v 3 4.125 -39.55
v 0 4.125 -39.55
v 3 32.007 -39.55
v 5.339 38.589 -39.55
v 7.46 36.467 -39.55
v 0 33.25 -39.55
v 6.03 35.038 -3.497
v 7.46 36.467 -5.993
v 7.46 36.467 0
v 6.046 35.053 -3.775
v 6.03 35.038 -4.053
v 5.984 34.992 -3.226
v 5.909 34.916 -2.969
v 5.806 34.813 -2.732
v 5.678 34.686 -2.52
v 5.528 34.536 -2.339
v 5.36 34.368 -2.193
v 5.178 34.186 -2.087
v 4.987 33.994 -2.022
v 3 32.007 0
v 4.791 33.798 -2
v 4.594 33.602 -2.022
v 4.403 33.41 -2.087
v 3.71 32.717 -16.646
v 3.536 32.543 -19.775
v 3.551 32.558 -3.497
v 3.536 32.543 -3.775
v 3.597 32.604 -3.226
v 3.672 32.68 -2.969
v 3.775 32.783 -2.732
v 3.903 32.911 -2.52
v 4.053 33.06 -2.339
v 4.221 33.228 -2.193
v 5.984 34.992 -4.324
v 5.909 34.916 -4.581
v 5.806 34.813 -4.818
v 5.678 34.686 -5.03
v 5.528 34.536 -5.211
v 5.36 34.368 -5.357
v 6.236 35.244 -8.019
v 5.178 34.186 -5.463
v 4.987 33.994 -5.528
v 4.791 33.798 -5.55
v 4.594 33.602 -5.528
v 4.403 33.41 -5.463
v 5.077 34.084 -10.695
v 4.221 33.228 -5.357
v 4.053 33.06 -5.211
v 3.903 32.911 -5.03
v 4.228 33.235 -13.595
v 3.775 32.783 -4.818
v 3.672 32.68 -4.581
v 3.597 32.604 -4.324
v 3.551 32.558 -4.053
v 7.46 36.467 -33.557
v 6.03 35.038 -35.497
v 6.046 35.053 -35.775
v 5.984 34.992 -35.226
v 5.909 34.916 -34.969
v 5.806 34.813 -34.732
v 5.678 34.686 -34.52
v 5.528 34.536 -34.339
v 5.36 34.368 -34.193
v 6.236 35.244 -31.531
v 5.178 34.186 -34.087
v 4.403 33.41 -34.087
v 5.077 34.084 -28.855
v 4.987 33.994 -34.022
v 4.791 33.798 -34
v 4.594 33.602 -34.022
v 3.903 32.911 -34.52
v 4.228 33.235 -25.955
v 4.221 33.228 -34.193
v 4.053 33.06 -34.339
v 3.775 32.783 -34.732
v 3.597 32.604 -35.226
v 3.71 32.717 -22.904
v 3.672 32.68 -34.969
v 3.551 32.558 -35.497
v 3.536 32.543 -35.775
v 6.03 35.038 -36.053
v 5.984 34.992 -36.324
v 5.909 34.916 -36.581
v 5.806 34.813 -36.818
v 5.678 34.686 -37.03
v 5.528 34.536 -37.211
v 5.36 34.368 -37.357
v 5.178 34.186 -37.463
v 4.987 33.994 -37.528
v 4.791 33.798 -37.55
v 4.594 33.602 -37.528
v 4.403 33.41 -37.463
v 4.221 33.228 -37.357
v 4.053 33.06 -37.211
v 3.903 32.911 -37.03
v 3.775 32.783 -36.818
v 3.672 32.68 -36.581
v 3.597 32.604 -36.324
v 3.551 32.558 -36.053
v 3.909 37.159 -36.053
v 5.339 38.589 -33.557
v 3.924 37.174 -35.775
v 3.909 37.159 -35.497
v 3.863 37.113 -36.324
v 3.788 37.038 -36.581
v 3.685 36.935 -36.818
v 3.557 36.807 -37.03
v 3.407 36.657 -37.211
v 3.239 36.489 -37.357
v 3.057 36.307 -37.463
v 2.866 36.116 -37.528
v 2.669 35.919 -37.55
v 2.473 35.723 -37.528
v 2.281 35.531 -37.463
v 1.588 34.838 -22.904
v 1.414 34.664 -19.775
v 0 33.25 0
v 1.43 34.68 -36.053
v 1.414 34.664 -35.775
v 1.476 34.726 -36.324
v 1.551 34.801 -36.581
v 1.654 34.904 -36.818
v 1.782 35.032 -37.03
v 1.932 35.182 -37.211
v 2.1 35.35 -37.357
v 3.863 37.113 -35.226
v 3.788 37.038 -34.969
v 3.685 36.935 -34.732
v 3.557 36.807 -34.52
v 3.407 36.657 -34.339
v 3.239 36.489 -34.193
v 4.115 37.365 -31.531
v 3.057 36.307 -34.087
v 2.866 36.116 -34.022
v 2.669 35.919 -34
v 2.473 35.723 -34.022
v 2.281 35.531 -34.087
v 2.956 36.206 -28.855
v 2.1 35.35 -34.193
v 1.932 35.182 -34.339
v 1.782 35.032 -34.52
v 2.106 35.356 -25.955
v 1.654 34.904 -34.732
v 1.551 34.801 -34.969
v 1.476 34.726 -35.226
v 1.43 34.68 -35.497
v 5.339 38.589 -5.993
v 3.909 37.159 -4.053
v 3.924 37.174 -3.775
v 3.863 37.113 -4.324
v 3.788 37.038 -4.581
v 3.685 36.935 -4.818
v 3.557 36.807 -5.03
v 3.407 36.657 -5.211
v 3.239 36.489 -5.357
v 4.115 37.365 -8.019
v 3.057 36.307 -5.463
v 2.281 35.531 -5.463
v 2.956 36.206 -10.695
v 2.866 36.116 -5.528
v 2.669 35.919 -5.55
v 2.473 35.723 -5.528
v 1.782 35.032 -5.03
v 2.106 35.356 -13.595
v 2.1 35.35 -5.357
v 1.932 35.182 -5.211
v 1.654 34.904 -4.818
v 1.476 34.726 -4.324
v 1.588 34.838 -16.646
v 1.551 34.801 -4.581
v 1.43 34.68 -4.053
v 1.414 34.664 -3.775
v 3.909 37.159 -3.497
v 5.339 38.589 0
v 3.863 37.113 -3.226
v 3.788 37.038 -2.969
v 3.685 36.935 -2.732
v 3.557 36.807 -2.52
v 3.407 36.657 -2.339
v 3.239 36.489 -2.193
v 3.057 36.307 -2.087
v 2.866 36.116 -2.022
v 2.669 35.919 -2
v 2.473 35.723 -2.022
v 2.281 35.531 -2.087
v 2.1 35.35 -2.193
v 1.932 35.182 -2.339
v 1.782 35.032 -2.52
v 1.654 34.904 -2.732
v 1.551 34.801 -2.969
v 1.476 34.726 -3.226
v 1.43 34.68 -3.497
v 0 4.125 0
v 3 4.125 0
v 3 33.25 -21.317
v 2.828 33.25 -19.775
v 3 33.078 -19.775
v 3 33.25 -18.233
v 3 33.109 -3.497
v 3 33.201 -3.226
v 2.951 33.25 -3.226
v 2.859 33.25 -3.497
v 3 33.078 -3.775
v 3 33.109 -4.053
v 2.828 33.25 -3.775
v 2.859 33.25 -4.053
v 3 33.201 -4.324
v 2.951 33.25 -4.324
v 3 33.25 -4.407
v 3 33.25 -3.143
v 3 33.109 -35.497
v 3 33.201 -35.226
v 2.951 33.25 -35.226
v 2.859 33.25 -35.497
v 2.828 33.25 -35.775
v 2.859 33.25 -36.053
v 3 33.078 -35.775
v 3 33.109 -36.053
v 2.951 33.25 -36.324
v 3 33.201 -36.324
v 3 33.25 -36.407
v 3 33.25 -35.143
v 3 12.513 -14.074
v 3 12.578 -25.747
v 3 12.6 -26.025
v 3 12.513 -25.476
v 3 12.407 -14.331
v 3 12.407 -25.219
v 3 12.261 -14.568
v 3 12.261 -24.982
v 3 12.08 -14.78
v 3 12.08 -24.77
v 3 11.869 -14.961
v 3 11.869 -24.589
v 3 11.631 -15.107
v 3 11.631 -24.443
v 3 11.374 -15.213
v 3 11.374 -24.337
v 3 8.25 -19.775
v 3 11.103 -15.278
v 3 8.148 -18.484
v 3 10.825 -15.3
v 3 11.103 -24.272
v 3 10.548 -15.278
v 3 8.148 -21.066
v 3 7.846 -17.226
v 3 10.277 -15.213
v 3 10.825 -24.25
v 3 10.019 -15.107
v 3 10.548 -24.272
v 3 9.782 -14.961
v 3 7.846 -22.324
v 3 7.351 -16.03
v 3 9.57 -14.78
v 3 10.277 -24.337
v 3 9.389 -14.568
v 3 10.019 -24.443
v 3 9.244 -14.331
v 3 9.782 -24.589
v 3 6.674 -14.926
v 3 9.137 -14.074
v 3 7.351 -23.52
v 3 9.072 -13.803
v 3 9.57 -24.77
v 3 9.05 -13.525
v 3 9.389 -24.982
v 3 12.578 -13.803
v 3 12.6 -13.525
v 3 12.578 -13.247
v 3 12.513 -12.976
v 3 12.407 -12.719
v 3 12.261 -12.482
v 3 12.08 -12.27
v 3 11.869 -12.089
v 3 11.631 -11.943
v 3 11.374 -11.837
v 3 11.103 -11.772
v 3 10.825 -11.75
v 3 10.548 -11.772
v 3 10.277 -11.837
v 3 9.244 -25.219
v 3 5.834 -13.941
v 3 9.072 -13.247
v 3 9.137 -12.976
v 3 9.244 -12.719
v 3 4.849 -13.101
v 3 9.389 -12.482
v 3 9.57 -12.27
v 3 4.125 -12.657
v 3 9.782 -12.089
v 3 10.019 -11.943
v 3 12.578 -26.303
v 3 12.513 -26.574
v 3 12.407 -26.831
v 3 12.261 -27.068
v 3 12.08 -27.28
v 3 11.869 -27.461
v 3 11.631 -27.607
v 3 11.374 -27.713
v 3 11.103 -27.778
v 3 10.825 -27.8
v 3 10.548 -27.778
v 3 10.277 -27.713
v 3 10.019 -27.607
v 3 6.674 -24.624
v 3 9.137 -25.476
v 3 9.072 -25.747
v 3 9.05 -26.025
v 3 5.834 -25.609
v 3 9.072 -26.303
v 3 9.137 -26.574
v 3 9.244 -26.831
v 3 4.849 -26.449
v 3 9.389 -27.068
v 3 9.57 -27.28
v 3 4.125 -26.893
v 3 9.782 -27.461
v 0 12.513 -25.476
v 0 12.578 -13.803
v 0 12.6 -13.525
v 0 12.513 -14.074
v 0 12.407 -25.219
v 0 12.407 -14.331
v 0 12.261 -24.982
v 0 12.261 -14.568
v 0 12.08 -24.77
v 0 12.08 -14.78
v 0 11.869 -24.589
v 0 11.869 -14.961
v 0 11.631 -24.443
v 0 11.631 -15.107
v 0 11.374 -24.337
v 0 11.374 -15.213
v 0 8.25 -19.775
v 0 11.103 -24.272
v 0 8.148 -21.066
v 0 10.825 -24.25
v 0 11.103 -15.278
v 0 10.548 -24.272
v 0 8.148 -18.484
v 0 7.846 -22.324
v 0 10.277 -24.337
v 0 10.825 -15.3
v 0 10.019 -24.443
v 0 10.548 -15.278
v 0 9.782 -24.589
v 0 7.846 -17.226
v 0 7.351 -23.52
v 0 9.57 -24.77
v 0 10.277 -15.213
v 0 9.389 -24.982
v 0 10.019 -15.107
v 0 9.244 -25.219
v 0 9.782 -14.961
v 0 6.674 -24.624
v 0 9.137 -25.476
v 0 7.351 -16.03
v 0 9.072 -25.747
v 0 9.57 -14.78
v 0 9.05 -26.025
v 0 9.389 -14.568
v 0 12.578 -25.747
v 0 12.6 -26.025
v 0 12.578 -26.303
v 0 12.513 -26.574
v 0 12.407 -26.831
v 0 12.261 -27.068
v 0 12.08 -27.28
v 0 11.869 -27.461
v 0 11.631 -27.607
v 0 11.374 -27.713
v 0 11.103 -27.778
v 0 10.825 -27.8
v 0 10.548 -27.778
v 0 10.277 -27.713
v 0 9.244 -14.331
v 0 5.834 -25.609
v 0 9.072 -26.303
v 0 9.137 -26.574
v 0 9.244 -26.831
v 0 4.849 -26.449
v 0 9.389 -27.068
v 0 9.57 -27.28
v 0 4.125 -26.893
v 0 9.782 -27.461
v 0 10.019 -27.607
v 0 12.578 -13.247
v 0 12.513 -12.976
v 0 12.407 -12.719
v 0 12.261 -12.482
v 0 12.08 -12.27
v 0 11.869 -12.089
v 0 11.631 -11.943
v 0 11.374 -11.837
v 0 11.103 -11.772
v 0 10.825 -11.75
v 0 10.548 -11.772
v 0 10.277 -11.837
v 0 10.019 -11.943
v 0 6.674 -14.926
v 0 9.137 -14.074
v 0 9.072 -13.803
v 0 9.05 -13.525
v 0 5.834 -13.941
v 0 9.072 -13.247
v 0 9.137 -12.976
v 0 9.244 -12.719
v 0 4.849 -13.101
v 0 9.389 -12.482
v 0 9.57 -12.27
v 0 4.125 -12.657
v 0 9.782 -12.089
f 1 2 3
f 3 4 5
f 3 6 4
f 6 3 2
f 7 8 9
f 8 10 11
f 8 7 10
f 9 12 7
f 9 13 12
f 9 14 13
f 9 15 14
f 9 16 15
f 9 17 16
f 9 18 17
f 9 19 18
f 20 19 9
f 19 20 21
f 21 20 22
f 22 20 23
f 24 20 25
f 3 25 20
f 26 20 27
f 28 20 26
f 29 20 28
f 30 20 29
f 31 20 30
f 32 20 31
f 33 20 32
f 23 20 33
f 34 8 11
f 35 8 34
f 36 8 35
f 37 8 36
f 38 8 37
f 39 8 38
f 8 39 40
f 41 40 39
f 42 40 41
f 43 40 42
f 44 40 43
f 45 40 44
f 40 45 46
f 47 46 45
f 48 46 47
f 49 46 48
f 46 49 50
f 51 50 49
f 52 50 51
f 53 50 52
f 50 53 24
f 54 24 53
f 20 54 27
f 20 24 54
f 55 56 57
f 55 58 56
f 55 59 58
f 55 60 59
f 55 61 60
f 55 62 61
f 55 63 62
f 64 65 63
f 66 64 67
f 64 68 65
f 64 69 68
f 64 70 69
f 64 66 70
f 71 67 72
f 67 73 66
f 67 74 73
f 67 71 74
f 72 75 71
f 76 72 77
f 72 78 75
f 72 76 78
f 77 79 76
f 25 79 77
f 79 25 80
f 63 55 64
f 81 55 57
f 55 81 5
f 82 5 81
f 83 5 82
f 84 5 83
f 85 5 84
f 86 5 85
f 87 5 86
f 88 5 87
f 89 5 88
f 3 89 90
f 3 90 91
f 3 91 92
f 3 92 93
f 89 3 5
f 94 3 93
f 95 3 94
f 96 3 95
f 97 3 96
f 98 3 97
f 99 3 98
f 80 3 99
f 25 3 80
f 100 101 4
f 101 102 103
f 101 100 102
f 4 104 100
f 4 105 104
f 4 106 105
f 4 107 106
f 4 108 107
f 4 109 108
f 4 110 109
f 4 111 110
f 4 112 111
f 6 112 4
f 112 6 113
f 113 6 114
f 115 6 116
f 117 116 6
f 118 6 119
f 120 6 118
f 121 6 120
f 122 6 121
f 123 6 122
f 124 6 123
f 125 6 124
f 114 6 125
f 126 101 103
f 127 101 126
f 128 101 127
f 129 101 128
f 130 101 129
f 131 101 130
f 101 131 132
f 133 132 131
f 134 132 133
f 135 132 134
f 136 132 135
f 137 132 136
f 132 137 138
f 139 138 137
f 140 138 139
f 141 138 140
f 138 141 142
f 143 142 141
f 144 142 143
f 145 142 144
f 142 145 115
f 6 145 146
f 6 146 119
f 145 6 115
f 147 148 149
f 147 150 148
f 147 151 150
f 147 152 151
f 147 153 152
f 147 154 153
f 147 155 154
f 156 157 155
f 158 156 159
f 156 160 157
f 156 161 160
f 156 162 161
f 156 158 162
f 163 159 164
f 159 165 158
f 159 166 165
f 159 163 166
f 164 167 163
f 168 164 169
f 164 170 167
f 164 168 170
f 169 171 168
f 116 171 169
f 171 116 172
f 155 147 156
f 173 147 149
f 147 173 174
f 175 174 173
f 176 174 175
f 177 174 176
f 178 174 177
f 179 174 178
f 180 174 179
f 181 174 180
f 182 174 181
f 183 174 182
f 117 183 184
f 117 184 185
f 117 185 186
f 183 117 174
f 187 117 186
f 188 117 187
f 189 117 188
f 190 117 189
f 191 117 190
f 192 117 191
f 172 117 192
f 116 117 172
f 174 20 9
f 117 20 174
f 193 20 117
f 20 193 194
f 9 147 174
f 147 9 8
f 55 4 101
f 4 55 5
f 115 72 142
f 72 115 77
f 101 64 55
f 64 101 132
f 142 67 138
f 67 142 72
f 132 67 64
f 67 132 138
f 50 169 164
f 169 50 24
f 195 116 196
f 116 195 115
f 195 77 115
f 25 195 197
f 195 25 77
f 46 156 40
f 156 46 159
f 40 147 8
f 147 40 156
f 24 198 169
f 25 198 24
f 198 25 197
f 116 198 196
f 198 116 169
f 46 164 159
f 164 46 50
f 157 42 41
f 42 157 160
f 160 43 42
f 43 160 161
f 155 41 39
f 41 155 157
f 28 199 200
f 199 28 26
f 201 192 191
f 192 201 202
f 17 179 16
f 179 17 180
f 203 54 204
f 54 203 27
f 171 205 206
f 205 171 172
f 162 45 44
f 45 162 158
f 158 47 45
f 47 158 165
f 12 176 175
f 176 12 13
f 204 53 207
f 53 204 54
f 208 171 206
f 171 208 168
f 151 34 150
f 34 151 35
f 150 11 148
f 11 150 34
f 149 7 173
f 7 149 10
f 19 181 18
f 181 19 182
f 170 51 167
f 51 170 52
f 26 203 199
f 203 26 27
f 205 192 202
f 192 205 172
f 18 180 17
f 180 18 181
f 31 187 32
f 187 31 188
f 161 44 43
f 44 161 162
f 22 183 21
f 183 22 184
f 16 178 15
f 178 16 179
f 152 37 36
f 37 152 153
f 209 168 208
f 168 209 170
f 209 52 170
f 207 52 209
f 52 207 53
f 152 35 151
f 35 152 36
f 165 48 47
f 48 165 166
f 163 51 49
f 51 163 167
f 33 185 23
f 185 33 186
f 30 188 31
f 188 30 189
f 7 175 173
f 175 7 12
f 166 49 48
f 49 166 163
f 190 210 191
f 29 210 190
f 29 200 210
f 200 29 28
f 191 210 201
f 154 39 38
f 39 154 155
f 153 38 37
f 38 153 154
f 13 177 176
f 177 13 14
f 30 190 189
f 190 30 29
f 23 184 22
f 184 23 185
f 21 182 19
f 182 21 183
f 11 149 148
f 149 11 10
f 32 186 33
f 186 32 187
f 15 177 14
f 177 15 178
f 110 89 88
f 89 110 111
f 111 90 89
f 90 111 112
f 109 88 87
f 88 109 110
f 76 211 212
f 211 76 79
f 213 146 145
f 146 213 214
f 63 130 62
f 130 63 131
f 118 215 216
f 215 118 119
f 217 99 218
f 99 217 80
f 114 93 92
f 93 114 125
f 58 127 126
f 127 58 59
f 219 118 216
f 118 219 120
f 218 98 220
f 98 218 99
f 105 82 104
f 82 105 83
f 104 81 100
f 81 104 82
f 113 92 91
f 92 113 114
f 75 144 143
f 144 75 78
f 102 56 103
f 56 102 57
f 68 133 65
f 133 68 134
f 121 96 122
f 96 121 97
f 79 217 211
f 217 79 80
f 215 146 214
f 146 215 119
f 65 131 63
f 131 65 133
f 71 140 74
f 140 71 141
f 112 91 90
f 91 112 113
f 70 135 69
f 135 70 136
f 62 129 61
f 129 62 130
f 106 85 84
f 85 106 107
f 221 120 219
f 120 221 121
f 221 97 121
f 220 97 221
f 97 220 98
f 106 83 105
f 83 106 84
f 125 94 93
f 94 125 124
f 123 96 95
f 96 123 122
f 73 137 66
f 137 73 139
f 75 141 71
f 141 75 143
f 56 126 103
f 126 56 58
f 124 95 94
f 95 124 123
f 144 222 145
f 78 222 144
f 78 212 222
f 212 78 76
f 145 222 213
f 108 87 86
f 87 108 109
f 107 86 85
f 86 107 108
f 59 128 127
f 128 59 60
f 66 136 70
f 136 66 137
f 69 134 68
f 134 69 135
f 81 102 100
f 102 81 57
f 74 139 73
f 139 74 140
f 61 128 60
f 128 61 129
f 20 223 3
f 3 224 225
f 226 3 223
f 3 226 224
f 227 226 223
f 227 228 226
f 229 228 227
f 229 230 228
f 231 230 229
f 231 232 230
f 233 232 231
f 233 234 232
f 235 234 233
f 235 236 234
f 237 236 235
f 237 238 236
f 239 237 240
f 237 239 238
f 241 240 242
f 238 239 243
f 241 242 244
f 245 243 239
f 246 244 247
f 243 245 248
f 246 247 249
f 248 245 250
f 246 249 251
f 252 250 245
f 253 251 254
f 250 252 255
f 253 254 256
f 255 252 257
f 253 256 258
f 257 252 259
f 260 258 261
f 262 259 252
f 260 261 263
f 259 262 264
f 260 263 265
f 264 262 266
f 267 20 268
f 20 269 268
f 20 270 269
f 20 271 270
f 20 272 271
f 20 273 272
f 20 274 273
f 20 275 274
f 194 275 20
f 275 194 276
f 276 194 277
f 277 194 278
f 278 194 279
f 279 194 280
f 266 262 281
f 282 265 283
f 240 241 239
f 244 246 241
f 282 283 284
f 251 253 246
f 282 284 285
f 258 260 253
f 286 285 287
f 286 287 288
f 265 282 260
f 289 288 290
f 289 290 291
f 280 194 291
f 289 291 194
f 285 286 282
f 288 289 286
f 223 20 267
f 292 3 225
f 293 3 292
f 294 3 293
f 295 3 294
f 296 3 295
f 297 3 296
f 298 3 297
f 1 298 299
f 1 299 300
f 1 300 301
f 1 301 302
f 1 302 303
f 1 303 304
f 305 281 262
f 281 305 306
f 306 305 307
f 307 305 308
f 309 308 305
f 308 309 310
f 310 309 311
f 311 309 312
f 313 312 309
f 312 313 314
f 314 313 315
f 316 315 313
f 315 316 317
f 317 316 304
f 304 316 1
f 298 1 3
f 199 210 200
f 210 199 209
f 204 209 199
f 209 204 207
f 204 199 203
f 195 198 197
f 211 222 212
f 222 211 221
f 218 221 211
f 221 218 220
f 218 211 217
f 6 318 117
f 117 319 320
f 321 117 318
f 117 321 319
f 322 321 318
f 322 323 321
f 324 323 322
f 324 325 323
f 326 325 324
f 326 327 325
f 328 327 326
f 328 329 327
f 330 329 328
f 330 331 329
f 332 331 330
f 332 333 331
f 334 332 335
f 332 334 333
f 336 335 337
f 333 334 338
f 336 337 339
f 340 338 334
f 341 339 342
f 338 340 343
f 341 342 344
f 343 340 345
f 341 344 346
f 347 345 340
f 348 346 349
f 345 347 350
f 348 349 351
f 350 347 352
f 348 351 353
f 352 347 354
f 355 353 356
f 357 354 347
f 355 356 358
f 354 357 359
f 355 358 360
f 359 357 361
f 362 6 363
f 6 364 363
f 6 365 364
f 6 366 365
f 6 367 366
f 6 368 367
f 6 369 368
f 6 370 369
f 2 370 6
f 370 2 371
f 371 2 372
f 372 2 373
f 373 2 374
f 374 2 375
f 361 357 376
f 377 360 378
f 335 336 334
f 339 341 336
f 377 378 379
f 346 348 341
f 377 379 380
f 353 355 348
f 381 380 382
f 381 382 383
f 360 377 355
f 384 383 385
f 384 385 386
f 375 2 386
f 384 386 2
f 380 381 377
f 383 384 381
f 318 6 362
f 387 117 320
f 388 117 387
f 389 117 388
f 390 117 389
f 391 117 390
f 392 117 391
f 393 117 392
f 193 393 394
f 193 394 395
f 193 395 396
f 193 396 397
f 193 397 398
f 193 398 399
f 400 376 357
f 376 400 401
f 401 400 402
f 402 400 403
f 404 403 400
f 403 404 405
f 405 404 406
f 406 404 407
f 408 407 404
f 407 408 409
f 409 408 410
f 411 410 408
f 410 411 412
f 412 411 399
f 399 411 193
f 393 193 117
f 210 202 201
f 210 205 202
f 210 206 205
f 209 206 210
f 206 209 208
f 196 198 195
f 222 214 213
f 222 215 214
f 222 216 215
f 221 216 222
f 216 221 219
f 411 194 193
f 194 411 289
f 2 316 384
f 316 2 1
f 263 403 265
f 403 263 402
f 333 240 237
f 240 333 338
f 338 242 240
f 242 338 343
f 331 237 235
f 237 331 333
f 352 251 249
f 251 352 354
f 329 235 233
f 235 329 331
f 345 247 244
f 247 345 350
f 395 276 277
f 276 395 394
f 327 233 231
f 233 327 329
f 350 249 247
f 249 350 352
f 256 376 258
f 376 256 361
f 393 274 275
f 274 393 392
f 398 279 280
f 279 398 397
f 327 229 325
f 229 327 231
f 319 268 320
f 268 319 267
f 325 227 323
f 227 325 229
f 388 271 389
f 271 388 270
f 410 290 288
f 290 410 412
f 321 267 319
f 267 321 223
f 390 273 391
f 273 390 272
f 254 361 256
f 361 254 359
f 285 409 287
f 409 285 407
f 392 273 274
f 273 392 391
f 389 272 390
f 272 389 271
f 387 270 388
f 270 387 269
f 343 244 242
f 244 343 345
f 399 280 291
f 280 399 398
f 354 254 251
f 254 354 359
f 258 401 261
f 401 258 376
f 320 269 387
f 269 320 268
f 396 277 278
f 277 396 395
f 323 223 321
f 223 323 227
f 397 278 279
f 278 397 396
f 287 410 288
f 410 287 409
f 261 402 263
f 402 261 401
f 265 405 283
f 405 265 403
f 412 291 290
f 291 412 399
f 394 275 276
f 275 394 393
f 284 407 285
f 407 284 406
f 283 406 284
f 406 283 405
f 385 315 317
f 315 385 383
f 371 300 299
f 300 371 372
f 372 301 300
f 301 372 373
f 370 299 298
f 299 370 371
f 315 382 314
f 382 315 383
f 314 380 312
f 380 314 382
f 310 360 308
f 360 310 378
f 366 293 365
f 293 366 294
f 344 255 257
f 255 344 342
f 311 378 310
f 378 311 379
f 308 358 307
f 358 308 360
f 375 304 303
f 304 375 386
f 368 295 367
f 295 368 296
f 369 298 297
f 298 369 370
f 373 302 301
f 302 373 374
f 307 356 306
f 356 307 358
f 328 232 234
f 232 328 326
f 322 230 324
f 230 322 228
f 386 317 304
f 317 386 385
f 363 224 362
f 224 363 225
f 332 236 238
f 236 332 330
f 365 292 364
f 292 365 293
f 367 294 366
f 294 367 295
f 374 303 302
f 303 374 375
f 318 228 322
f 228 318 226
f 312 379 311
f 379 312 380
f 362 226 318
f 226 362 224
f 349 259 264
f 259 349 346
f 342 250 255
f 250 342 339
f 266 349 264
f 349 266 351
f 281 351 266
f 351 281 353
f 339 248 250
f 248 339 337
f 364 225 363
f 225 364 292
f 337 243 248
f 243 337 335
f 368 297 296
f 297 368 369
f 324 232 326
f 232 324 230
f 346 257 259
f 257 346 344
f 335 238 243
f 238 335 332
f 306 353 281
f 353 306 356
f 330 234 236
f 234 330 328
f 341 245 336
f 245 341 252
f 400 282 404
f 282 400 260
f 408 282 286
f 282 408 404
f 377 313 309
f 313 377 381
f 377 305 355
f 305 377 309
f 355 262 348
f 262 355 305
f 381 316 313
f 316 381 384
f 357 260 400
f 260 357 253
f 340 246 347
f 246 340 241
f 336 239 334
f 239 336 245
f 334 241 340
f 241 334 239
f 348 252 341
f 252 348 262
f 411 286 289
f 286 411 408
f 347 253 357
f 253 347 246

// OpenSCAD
// file: configuration.scad
// Increase this if your slicer or printer make holes too tight.
extra_radius = 0.15;

// OD = outside diameter, corner to corner.
m3_nut_od = 6.1;
m3_nut_radius = m3_nut_od/2 + 0.2 + extra_radius;
m3_washer_radius = 3.5 + extra_radius;


// OD = outside diameter, corner to corner.
m3_nut_od = 6.1;
m3_nut_radius = m3_nut_od/2 + 0.2 + extra_radius;
m3_washer_radius = 3.5 + extra_radius;


// Major diameter of metric 3mm thread.
m3_major = 2.85;
m3_radius = m3_major/2 + extra_radius;
m3_wide_radius = m3_major/2 + extra_radius + 0.2;

// NEMA17 stepper motors.
motor_shaft_diameter = 5;
motor_shaft_radius = motor_shaft_diameter/2 + extra_radius;

// Frame brackets. M3x8mm screws work best with 3.6 mm brackets.
thickness = 3.6;

// OpenBeam or Misumi. Currently only 15x15 mm, but there is a plan
// to make models more parametric and allow 20x20 mm in the future.
extrusion = 15;

// Placement for the NEMA17 stepper motors.
motor_offset = 44;
motor_length = 47;
// main file
include <configuration.scad>;

// Input parameters
mount_thickness = 3;                             // Overall thickness (mm)
mount_angle = 45;                                // Angle to mount the fan at (degrees)
hole_radius = 12.5;                              // Radius at which the effector mount holes are made (mm)
effector_offset = 25;                            // Length of the side that offsets the fan from the effector (mm)
fan_radius = 20;                                 // overall fan radius, e.g. 40mm fan = 20 (mm)
fan_hole_pitch = 32;                             // pitch of the fan mounting holes (mm)
hole_offset = 2;                                 // space between thru holes and edges (mm)
hotend_radius = 8 + 0.25;                        // Radius of the hotend + buffer (mm)

// Calculated parameters
bracket_length = 2*(hole_offset+m3_wide_radius);                // Length of the angled portion (mm)
bracket_width = fan_hole_pitch+2*(hole_offset+m3_wide_radius);  // Overall bracket width (mm)

$fn = 40;

rotate(a=90, v=[0,1,0]) // print on its side for a strong angle joint
difference() {
  union() {
    translate([0, hotend_radius+effector_offset, 0])
    rotate(a=mount_angle, v=[1,0,0])
      difference() {
        cube([bracket_width, bracket_length, mount_thickness]);
        translate([bracket_width/2, fan_radius+hole_offset, 0])
          cylinder(r=fan_radius, h=mount_thickness);

        // Fan mounting holes
        translate([m3_wide_radius+hole_offset, m3_wide_radius+hole_offset, 0])
          cylinder(r=m3_wide_radius, h=mount_thickness);
        translate([bracket_width-m3_wide_radius-hole_offset, m3_wide_radius+hole_offset, 0])
          cylinder(r=m3_wide_radius, h=mount_thickness);
    }

    // Effector mounting side
    translate([0, hotend_radius/2, 0])
      cube([bracket_width, effector_offset+hotend_radius/2, mount_thickness]);
  }

  // Thru holes
  for (hole_angle = [-30:60:30]) {
    translate([bracket_width/2, 0, 0])
      translate([sin(hole_angle)*hole_radius,cos(hole_angle)*hole_radius,0])
      cylinder(r=m3_wide_radius, h=mount_thickness);
  }

  // Thru hole for hotend
  translate([bracket_width/2, 0, 0])
      cylinder(r=hotend_radius, h=mount_thickness);
};
